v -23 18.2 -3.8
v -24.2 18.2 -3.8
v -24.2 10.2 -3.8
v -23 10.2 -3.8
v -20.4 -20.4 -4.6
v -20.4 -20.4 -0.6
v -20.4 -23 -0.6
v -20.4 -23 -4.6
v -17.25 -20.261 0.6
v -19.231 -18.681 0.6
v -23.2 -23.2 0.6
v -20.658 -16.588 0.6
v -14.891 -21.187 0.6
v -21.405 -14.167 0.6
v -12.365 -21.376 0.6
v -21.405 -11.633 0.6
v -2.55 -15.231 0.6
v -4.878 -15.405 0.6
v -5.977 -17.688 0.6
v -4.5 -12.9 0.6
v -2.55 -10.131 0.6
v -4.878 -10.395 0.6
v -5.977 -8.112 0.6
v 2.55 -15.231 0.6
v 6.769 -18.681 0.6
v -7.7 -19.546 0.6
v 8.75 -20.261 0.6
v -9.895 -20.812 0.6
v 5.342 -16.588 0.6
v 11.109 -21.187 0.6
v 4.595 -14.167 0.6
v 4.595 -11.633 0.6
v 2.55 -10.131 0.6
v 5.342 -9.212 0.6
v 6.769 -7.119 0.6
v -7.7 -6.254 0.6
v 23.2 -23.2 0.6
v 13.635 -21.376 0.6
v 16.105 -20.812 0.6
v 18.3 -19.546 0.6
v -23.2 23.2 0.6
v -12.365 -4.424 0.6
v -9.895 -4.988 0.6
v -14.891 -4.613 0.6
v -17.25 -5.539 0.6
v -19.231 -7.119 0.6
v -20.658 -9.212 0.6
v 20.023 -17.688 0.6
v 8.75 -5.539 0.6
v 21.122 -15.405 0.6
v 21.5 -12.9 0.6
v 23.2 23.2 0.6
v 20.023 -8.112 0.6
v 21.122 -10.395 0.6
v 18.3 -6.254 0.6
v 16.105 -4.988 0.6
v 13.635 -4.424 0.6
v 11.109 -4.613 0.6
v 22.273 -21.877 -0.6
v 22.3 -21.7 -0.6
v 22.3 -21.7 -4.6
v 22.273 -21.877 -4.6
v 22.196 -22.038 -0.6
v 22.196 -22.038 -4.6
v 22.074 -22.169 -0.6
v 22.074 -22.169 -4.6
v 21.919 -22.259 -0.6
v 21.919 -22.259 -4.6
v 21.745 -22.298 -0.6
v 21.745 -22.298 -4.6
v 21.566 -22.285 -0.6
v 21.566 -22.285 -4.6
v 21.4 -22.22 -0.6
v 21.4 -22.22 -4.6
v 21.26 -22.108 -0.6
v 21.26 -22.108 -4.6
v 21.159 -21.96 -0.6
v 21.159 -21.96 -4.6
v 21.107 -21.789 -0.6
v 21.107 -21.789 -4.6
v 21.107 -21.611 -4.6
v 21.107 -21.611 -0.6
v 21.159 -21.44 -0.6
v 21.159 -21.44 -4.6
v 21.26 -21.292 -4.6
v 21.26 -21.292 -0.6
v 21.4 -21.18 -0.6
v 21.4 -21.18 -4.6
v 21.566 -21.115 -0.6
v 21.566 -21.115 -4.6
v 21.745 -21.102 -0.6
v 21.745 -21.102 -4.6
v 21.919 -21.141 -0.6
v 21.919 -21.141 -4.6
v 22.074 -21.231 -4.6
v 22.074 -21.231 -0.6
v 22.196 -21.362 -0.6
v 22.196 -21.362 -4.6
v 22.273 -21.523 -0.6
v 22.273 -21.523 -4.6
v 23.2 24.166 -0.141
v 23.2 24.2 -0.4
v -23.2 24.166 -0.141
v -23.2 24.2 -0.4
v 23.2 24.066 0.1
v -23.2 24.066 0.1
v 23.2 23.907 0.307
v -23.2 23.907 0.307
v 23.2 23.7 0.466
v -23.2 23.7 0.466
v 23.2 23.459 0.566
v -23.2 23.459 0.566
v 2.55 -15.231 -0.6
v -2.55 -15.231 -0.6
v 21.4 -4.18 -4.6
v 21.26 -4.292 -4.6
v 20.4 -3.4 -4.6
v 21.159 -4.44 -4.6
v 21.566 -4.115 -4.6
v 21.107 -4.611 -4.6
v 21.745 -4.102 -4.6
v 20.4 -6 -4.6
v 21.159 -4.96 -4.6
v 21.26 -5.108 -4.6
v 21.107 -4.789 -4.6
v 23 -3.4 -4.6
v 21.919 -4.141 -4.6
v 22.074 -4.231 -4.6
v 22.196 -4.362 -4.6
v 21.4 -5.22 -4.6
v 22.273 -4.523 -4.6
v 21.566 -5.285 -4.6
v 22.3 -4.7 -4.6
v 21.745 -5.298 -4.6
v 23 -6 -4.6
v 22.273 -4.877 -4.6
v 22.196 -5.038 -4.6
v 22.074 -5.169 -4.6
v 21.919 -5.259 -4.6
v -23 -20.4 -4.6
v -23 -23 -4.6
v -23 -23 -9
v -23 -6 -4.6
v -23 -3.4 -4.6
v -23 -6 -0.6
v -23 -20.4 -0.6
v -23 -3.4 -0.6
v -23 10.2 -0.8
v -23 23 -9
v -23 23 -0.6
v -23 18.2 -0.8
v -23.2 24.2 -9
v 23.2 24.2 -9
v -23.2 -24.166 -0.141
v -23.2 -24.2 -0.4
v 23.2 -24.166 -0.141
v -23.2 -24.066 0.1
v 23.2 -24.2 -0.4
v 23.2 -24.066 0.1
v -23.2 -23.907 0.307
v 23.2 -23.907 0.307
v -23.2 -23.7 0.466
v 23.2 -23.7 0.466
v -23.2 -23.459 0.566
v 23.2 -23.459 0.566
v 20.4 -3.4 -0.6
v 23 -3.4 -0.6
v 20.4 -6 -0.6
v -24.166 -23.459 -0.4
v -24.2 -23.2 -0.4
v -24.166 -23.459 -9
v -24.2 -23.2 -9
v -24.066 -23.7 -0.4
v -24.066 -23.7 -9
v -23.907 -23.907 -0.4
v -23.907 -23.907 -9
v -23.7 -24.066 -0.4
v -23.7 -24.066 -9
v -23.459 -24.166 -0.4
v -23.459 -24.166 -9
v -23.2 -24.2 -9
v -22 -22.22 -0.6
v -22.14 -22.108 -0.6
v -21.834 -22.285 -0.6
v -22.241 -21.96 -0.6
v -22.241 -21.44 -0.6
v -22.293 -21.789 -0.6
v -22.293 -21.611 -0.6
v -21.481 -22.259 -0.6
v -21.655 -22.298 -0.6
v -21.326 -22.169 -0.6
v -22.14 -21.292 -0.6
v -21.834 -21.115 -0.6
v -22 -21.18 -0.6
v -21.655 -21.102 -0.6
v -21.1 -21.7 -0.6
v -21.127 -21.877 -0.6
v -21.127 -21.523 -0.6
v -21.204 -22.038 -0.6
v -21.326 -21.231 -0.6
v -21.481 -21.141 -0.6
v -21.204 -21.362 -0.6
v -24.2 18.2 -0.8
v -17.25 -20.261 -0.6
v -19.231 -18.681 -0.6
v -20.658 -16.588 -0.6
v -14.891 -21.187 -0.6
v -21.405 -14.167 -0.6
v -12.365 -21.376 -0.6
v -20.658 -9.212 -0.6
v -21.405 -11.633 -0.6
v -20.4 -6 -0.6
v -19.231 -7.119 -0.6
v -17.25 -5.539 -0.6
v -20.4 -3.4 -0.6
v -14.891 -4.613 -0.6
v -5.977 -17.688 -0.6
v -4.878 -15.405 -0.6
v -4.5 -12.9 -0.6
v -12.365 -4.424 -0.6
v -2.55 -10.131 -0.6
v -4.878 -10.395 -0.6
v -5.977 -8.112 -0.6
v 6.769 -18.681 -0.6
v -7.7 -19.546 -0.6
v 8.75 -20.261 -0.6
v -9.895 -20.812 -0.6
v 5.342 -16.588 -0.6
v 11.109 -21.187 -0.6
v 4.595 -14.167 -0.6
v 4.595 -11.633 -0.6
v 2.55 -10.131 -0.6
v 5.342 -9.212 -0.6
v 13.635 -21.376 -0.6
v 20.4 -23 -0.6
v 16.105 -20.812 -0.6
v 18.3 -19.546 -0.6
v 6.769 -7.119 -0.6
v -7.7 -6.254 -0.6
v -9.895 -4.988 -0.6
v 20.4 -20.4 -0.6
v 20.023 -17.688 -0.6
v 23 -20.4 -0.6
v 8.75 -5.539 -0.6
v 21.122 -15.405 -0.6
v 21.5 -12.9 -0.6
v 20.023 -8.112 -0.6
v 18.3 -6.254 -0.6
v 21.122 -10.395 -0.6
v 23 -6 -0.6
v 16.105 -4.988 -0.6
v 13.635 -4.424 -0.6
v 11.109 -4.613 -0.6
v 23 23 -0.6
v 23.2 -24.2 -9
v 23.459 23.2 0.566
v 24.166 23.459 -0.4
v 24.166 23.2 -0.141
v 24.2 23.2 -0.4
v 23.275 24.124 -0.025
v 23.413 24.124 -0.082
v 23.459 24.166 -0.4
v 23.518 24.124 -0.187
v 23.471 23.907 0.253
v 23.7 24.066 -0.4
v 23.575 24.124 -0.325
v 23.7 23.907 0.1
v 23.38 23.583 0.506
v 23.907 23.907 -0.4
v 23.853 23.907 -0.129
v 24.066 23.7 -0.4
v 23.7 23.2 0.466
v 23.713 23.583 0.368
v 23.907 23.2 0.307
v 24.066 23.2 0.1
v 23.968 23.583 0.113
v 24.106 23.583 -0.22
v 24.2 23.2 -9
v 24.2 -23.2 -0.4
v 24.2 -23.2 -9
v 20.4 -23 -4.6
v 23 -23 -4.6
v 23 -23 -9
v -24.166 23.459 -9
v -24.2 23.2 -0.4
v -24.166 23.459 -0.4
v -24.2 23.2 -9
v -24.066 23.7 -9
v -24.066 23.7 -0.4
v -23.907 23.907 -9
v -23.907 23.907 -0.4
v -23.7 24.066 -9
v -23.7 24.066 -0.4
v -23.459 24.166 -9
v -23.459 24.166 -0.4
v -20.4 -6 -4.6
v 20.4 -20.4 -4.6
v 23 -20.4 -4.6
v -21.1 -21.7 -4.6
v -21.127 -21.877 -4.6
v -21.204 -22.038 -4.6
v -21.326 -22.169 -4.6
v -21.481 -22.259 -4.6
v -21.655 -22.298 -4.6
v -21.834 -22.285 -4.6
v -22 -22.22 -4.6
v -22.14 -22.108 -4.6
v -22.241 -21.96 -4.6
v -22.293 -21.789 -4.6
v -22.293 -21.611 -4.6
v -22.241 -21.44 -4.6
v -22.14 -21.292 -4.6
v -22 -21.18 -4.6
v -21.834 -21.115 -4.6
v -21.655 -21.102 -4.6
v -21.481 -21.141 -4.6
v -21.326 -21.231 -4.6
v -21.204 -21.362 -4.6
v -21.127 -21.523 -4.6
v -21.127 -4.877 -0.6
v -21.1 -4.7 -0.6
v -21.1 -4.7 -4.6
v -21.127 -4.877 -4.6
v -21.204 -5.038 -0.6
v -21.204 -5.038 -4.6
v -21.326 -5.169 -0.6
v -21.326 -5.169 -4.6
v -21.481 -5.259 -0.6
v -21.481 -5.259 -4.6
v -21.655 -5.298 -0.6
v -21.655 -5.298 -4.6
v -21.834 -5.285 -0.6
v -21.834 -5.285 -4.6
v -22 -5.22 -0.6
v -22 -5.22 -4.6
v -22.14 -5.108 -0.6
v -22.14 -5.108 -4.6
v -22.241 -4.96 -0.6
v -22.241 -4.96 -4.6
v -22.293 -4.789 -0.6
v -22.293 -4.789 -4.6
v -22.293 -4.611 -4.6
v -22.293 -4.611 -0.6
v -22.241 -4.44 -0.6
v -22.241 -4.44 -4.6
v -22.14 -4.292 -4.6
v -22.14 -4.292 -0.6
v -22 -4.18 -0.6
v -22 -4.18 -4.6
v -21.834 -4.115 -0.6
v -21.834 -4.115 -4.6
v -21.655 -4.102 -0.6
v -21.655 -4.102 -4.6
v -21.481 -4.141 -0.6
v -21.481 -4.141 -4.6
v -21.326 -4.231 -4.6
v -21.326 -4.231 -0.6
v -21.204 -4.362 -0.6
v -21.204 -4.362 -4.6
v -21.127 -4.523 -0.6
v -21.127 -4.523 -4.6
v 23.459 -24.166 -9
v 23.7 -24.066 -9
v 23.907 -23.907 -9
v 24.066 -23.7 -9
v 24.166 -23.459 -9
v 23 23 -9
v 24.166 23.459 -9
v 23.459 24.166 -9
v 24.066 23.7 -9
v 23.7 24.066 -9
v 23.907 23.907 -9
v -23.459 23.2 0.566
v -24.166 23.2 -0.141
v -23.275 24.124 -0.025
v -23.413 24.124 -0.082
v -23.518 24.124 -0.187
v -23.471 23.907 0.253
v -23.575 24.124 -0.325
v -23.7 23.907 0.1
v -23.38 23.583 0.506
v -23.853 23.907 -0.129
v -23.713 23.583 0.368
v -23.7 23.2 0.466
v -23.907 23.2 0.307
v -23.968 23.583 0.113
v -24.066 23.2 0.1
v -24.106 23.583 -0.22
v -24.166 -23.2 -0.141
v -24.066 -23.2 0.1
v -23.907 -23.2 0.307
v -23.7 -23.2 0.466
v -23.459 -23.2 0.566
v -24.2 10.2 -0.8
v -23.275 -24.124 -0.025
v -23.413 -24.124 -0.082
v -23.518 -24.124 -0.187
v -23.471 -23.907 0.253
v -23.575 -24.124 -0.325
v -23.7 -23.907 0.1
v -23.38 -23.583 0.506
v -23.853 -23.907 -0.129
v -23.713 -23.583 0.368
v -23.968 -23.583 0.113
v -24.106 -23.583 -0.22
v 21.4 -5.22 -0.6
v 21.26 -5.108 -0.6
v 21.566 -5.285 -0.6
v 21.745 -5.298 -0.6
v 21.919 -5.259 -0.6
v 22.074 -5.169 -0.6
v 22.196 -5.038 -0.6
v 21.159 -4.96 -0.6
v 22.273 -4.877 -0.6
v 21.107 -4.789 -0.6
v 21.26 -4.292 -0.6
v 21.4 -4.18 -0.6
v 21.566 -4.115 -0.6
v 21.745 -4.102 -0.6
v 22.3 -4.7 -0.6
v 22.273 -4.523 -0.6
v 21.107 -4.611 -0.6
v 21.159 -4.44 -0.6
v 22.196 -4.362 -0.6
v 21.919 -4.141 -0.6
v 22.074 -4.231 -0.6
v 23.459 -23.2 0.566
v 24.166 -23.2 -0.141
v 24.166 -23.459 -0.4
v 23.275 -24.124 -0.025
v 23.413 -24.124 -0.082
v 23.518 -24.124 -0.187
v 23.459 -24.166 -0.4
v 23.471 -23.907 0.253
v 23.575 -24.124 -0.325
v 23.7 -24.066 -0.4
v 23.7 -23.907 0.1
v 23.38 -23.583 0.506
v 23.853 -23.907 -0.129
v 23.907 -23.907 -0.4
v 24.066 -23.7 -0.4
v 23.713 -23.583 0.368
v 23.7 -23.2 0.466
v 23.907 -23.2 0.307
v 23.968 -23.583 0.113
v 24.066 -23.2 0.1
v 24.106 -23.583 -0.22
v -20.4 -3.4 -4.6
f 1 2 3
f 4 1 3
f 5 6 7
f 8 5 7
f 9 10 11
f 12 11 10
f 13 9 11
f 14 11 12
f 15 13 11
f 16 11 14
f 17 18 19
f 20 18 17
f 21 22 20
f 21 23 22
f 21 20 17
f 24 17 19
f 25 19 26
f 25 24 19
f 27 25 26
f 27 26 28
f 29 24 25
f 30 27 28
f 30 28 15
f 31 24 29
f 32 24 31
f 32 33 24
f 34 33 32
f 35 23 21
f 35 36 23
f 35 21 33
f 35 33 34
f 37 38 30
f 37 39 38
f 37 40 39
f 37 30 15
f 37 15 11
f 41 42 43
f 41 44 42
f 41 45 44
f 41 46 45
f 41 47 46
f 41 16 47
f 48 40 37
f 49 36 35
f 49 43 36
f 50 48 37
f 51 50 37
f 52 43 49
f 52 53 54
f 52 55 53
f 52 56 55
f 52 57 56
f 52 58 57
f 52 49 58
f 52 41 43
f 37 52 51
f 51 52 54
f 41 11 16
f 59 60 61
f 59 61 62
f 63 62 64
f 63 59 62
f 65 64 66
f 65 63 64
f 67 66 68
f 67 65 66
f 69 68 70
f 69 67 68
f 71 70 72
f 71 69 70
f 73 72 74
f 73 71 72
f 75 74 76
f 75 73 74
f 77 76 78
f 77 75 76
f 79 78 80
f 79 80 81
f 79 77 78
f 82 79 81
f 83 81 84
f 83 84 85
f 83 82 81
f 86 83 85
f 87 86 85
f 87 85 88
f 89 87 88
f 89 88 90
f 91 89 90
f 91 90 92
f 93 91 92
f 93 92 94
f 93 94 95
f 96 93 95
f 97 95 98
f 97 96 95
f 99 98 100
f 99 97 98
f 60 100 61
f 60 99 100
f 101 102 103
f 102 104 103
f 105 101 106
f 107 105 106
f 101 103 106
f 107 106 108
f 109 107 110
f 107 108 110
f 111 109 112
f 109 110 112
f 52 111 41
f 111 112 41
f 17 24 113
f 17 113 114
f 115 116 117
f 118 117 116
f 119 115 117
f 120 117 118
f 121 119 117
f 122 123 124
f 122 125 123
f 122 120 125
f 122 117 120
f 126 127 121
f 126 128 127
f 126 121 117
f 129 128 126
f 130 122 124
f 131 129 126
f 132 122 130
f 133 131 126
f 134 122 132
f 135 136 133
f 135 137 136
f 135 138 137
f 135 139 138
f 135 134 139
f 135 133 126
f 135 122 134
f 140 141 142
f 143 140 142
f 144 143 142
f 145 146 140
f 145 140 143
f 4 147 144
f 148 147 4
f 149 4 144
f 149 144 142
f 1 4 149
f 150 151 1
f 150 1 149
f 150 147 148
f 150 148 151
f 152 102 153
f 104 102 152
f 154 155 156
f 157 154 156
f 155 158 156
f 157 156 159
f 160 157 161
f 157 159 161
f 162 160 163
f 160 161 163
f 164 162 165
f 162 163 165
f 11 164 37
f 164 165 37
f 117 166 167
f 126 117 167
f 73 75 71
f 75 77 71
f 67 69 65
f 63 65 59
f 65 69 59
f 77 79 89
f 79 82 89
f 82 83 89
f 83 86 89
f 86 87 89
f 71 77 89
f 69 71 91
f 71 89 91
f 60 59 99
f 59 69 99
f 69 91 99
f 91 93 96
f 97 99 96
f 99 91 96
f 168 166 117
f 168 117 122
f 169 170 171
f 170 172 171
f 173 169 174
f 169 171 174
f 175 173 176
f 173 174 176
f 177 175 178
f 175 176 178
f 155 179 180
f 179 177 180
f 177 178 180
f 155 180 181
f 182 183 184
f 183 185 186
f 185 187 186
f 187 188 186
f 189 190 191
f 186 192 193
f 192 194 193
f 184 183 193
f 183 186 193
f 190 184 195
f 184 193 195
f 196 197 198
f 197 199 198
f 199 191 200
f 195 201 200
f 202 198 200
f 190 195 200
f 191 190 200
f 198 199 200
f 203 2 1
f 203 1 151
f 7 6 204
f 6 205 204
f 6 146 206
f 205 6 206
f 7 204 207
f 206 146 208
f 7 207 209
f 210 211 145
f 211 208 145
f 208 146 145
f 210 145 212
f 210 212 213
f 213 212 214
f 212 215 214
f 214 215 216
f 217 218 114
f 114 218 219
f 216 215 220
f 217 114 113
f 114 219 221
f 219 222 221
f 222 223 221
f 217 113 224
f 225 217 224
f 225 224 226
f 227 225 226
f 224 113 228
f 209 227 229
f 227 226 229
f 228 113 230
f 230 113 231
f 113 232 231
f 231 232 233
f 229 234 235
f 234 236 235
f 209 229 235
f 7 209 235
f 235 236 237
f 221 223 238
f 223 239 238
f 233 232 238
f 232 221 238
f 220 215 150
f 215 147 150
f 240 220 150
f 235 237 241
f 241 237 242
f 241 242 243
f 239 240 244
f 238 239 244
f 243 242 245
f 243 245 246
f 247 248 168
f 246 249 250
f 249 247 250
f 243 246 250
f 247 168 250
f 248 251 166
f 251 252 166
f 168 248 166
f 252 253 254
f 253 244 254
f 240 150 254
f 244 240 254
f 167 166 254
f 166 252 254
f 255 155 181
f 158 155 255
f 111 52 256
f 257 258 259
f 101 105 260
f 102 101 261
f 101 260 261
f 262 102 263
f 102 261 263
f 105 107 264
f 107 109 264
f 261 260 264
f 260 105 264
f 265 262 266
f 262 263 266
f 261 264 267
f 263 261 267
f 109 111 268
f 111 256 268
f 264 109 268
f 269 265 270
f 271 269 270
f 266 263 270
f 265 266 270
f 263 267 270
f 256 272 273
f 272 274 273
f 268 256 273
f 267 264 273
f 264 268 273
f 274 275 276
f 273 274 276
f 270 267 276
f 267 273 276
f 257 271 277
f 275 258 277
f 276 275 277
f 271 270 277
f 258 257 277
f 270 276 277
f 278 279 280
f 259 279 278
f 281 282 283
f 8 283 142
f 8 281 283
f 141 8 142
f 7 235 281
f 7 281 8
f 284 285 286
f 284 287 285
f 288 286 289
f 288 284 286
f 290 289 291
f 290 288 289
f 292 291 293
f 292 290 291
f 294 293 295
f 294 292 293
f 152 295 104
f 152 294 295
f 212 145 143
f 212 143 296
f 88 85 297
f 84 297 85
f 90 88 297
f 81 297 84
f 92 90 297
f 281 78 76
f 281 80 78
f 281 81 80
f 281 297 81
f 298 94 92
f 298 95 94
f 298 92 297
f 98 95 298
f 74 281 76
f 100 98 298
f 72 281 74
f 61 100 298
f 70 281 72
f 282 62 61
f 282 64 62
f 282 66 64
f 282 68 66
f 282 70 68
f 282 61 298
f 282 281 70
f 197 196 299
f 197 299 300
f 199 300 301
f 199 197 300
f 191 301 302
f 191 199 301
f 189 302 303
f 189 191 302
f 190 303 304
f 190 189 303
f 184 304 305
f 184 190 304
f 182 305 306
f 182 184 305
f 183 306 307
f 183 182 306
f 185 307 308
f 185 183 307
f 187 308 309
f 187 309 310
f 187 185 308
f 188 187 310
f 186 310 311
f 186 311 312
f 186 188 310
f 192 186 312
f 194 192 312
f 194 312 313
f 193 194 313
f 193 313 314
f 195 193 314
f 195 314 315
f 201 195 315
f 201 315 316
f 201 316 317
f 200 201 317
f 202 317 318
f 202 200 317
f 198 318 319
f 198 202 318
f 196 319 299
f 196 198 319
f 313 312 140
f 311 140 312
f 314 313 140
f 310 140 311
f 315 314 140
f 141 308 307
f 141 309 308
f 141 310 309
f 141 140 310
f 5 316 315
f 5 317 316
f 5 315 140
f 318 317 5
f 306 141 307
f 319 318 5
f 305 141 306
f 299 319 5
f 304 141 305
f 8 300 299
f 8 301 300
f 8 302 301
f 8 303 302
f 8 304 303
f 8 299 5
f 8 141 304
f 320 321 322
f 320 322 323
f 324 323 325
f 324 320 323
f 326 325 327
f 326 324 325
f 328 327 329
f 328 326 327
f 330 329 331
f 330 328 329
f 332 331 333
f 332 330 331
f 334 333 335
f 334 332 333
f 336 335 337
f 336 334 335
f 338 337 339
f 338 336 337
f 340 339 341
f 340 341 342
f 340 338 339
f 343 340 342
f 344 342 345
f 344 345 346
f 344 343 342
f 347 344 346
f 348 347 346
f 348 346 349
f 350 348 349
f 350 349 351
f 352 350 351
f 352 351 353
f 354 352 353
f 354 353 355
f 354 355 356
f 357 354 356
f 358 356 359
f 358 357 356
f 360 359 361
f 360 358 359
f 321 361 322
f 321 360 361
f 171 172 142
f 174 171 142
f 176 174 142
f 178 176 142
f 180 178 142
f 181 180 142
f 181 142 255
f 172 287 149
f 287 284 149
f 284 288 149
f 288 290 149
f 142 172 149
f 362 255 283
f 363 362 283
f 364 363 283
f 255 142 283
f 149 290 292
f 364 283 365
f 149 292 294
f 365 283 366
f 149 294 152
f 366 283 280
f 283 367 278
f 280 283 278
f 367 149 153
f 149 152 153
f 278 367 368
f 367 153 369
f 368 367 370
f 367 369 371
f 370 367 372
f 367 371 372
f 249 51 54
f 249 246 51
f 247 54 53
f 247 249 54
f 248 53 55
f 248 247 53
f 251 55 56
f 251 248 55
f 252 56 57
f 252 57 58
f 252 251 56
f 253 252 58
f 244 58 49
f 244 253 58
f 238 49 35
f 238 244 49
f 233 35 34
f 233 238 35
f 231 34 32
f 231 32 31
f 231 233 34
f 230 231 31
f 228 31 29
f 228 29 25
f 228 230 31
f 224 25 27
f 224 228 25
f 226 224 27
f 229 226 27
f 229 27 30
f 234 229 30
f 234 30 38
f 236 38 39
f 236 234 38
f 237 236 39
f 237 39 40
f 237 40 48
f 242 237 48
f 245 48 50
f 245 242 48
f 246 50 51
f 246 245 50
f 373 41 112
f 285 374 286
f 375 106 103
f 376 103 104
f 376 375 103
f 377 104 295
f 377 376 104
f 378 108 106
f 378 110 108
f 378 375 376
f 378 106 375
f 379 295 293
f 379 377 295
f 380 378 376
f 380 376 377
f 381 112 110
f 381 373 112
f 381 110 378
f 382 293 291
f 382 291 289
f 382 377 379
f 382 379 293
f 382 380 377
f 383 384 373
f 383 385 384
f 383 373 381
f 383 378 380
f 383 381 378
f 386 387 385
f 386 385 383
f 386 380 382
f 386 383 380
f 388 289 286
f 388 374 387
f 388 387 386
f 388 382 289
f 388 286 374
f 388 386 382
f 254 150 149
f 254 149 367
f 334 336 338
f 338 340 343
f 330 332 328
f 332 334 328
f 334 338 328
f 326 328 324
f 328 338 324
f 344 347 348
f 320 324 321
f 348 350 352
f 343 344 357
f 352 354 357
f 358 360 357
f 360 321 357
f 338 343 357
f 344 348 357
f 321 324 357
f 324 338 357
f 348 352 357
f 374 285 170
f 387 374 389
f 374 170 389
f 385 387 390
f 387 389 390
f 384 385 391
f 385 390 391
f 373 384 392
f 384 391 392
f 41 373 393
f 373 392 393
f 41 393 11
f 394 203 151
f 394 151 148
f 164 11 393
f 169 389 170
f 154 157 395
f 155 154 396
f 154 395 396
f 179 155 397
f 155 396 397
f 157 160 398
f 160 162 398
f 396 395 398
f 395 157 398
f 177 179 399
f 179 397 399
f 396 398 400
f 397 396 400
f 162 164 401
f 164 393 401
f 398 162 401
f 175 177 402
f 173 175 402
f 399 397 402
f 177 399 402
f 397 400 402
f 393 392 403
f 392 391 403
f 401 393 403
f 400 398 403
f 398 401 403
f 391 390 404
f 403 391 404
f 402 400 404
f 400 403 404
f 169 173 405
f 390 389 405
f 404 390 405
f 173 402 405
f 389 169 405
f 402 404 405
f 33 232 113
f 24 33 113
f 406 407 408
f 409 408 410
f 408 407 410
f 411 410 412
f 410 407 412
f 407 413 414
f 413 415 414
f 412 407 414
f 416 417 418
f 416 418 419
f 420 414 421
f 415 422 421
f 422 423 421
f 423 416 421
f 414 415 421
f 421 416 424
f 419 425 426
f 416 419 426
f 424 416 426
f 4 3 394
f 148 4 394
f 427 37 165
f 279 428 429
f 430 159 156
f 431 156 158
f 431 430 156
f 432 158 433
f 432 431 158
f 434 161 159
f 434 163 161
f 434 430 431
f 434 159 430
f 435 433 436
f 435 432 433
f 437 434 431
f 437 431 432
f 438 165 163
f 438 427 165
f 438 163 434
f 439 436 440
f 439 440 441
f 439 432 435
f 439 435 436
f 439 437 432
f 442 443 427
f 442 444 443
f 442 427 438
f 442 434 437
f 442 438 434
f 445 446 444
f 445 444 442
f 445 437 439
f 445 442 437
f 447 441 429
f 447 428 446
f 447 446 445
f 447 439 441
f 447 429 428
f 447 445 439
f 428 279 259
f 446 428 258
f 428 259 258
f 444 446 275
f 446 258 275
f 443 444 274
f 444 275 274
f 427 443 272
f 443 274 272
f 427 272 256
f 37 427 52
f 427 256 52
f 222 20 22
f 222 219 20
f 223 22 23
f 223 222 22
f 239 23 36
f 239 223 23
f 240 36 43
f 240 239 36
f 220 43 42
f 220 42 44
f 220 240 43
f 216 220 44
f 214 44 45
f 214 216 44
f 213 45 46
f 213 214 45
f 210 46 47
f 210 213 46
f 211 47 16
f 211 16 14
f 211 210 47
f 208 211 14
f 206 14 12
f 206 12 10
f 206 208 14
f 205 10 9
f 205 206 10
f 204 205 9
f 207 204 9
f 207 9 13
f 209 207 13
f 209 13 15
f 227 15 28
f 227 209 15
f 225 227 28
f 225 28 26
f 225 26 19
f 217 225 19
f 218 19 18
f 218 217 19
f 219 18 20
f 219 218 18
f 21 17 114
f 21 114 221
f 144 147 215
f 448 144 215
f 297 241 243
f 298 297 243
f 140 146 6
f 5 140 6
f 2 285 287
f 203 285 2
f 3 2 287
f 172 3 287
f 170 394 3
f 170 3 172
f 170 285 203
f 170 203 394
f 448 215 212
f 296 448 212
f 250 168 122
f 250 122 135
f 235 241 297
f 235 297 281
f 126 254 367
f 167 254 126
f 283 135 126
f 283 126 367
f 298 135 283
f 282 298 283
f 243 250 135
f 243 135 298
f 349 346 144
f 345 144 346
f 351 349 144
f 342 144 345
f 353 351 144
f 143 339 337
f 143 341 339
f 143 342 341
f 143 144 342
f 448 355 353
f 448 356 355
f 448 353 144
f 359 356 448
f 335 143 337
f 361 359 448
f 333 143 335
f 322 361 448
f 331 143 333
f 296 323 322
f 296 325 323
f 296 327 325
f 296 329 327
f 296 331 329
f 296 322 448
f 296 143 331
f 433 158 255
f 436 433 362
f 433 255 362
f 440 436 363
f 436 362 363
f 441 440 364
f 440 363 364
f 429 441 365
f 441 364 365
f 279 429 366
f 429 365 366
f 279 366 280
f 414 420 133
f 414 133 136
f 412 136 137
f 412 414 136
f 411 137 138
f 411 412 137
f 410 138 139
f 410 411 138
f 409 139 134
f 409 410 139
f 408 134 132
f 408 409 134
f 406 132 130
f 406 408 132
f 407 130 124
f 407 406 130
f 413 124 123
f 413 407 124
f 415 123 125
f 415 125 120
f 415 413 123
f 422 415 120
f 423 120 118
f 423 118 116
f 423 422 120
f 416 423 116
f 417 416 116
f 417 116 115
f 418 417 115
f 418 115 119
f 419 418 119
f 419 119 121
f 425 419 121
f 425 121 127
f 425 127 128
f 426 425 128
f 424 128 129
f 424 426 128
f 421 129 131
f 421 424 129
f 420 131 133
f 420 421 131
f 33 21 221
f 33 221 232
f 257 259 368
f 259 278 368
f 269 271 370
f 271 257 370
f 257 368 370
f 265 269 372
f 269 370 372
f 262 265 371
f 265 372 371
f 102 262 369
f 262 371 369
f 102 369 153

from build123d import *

# Parameters (mm, degrees)
F0_W     = 23
F0_H     = 23
F0_R     = 8.5
F1_DEPTH = 0.6
F3_DEPTH = 9.6
F4_W     = 2.6
F4_H     = 2.6
F4_R     = 0.6
F5_DEPTH = 4
F6_W     = 8
F6_H     = 3
F7_DEPTH = 1.4
F8_R     = 1


with BuildPart() as f1:
    # F0 (on Top) → F1 (new body, symmetric)
    with BuildSketch(Plane.XY):
        with Locations((-11.5, 11.5)):
            Rectangle(F0_W, F0_H)
        Polygon((0, -10.131208), (0, 0), (-23, 0), (-23, -23), (0, -23), (0, -15.231208), (-2.55, -15.231208), (-2.55, -10.131208), align=None)
        with Locations((-13, -12.9)):
            Circle(F0_R, mode=Mode.SUBTRACT)
        with Locations((11.5, 11.5)):
            Rectangle(F0_W, F0_H)
        Polygon((23, 0), (0, 0), (0, -10.131208), (2.55, -10.131208), (2.55, -15.231208), (0, -15.231208), (0, -23), (23, -23), align=None)
        with Locations((13, -12.9)):
            Circle(F0_R, mode=Mode.SUBTRACT)
    extrude(amount=F1_DEPTH, both=True)

    # F2 (on face) → F3 (join)
    with BuildSketch(Plane.XY.offset(0.6)):
        Polygon((-23, 23), (0, 23), (0, 24.2), (-24.2, 24.2), (-24.2, -24.2), (0, -24.2), (0, -23), (-23, -23), align=None)
        Polygon((0, 23), (23, 23), (23, -23), (0, -23), (0, -24.2), (24.2, -24.2), (24.2, 24.2), (0, 24.2), align=None)
    extrude(amount=-F3_DEPTH)

    # F4 (on face) → F5 (join)
    with BuildSketch(Plane(origin=(0, 0, -0.6), x_dir=(1, 0, 0), z_dir=(0, 0, -1))):
        with Locations((21.7, 21.7)):
            Rectangle(F4_W, F4_H)
        with Locations((21.7, 21.7)):
            Circle(F4_R, mode=Mode.SUBTRACT)
        with Locations((-21.7, 21.7)):
            Rectangle(F4_W, F4_H)
        with Locations((-21.7, 21.7)):
            Circle(F4_R, mode=Mode.SUBTRACT)
        with Locations((-21.7, 4.7)):
            Rectangle(F4_W, F4_H)
        with Locations((-21.7, 4.7)):
            Circle(F4_R, mode=Mode.SUBTRACT)
        with Locations((21.7, 4.7)):
            Rectangle(F4_W, F4_H)
        with Locations((21.7, 4.7)):
            Circle(F4_R, mode=Mode.SUBTRACT)
    extrude(amount=F5_DEPTH)

    # F6 (on face) → F7 (cut)
    with BuildSketch(Plane(origin=(-24.2, 0, 0), x_dir=(0, -1, 0), z_dir=(-1, 0, 0))):
        with Locations((-14.2, -2.3)):
            Rectangle(F6_W, F6_H)
    extrude(amount=-F7_DEPTH, mode=Mode.SUBTRACT)

    # F8
    f8_edges = [f1.edges().sort_by_distance(p)[0] for p in [
        (24.2, 0, 0.6),
        (-24.2, 0, 0.6),
        (0, -24.2, 0.6),
        (0, 24.2, 0.6),
        (24.2, -24.2, -4.2),
        (24.2, 24.2, -4.2),
        (-24.2, -24.2, -4.2),
        (-24.2, 24.2, -4.2),
    ]]
    fillet(f8_edges, radius=F8_R)


solid = f1.part
